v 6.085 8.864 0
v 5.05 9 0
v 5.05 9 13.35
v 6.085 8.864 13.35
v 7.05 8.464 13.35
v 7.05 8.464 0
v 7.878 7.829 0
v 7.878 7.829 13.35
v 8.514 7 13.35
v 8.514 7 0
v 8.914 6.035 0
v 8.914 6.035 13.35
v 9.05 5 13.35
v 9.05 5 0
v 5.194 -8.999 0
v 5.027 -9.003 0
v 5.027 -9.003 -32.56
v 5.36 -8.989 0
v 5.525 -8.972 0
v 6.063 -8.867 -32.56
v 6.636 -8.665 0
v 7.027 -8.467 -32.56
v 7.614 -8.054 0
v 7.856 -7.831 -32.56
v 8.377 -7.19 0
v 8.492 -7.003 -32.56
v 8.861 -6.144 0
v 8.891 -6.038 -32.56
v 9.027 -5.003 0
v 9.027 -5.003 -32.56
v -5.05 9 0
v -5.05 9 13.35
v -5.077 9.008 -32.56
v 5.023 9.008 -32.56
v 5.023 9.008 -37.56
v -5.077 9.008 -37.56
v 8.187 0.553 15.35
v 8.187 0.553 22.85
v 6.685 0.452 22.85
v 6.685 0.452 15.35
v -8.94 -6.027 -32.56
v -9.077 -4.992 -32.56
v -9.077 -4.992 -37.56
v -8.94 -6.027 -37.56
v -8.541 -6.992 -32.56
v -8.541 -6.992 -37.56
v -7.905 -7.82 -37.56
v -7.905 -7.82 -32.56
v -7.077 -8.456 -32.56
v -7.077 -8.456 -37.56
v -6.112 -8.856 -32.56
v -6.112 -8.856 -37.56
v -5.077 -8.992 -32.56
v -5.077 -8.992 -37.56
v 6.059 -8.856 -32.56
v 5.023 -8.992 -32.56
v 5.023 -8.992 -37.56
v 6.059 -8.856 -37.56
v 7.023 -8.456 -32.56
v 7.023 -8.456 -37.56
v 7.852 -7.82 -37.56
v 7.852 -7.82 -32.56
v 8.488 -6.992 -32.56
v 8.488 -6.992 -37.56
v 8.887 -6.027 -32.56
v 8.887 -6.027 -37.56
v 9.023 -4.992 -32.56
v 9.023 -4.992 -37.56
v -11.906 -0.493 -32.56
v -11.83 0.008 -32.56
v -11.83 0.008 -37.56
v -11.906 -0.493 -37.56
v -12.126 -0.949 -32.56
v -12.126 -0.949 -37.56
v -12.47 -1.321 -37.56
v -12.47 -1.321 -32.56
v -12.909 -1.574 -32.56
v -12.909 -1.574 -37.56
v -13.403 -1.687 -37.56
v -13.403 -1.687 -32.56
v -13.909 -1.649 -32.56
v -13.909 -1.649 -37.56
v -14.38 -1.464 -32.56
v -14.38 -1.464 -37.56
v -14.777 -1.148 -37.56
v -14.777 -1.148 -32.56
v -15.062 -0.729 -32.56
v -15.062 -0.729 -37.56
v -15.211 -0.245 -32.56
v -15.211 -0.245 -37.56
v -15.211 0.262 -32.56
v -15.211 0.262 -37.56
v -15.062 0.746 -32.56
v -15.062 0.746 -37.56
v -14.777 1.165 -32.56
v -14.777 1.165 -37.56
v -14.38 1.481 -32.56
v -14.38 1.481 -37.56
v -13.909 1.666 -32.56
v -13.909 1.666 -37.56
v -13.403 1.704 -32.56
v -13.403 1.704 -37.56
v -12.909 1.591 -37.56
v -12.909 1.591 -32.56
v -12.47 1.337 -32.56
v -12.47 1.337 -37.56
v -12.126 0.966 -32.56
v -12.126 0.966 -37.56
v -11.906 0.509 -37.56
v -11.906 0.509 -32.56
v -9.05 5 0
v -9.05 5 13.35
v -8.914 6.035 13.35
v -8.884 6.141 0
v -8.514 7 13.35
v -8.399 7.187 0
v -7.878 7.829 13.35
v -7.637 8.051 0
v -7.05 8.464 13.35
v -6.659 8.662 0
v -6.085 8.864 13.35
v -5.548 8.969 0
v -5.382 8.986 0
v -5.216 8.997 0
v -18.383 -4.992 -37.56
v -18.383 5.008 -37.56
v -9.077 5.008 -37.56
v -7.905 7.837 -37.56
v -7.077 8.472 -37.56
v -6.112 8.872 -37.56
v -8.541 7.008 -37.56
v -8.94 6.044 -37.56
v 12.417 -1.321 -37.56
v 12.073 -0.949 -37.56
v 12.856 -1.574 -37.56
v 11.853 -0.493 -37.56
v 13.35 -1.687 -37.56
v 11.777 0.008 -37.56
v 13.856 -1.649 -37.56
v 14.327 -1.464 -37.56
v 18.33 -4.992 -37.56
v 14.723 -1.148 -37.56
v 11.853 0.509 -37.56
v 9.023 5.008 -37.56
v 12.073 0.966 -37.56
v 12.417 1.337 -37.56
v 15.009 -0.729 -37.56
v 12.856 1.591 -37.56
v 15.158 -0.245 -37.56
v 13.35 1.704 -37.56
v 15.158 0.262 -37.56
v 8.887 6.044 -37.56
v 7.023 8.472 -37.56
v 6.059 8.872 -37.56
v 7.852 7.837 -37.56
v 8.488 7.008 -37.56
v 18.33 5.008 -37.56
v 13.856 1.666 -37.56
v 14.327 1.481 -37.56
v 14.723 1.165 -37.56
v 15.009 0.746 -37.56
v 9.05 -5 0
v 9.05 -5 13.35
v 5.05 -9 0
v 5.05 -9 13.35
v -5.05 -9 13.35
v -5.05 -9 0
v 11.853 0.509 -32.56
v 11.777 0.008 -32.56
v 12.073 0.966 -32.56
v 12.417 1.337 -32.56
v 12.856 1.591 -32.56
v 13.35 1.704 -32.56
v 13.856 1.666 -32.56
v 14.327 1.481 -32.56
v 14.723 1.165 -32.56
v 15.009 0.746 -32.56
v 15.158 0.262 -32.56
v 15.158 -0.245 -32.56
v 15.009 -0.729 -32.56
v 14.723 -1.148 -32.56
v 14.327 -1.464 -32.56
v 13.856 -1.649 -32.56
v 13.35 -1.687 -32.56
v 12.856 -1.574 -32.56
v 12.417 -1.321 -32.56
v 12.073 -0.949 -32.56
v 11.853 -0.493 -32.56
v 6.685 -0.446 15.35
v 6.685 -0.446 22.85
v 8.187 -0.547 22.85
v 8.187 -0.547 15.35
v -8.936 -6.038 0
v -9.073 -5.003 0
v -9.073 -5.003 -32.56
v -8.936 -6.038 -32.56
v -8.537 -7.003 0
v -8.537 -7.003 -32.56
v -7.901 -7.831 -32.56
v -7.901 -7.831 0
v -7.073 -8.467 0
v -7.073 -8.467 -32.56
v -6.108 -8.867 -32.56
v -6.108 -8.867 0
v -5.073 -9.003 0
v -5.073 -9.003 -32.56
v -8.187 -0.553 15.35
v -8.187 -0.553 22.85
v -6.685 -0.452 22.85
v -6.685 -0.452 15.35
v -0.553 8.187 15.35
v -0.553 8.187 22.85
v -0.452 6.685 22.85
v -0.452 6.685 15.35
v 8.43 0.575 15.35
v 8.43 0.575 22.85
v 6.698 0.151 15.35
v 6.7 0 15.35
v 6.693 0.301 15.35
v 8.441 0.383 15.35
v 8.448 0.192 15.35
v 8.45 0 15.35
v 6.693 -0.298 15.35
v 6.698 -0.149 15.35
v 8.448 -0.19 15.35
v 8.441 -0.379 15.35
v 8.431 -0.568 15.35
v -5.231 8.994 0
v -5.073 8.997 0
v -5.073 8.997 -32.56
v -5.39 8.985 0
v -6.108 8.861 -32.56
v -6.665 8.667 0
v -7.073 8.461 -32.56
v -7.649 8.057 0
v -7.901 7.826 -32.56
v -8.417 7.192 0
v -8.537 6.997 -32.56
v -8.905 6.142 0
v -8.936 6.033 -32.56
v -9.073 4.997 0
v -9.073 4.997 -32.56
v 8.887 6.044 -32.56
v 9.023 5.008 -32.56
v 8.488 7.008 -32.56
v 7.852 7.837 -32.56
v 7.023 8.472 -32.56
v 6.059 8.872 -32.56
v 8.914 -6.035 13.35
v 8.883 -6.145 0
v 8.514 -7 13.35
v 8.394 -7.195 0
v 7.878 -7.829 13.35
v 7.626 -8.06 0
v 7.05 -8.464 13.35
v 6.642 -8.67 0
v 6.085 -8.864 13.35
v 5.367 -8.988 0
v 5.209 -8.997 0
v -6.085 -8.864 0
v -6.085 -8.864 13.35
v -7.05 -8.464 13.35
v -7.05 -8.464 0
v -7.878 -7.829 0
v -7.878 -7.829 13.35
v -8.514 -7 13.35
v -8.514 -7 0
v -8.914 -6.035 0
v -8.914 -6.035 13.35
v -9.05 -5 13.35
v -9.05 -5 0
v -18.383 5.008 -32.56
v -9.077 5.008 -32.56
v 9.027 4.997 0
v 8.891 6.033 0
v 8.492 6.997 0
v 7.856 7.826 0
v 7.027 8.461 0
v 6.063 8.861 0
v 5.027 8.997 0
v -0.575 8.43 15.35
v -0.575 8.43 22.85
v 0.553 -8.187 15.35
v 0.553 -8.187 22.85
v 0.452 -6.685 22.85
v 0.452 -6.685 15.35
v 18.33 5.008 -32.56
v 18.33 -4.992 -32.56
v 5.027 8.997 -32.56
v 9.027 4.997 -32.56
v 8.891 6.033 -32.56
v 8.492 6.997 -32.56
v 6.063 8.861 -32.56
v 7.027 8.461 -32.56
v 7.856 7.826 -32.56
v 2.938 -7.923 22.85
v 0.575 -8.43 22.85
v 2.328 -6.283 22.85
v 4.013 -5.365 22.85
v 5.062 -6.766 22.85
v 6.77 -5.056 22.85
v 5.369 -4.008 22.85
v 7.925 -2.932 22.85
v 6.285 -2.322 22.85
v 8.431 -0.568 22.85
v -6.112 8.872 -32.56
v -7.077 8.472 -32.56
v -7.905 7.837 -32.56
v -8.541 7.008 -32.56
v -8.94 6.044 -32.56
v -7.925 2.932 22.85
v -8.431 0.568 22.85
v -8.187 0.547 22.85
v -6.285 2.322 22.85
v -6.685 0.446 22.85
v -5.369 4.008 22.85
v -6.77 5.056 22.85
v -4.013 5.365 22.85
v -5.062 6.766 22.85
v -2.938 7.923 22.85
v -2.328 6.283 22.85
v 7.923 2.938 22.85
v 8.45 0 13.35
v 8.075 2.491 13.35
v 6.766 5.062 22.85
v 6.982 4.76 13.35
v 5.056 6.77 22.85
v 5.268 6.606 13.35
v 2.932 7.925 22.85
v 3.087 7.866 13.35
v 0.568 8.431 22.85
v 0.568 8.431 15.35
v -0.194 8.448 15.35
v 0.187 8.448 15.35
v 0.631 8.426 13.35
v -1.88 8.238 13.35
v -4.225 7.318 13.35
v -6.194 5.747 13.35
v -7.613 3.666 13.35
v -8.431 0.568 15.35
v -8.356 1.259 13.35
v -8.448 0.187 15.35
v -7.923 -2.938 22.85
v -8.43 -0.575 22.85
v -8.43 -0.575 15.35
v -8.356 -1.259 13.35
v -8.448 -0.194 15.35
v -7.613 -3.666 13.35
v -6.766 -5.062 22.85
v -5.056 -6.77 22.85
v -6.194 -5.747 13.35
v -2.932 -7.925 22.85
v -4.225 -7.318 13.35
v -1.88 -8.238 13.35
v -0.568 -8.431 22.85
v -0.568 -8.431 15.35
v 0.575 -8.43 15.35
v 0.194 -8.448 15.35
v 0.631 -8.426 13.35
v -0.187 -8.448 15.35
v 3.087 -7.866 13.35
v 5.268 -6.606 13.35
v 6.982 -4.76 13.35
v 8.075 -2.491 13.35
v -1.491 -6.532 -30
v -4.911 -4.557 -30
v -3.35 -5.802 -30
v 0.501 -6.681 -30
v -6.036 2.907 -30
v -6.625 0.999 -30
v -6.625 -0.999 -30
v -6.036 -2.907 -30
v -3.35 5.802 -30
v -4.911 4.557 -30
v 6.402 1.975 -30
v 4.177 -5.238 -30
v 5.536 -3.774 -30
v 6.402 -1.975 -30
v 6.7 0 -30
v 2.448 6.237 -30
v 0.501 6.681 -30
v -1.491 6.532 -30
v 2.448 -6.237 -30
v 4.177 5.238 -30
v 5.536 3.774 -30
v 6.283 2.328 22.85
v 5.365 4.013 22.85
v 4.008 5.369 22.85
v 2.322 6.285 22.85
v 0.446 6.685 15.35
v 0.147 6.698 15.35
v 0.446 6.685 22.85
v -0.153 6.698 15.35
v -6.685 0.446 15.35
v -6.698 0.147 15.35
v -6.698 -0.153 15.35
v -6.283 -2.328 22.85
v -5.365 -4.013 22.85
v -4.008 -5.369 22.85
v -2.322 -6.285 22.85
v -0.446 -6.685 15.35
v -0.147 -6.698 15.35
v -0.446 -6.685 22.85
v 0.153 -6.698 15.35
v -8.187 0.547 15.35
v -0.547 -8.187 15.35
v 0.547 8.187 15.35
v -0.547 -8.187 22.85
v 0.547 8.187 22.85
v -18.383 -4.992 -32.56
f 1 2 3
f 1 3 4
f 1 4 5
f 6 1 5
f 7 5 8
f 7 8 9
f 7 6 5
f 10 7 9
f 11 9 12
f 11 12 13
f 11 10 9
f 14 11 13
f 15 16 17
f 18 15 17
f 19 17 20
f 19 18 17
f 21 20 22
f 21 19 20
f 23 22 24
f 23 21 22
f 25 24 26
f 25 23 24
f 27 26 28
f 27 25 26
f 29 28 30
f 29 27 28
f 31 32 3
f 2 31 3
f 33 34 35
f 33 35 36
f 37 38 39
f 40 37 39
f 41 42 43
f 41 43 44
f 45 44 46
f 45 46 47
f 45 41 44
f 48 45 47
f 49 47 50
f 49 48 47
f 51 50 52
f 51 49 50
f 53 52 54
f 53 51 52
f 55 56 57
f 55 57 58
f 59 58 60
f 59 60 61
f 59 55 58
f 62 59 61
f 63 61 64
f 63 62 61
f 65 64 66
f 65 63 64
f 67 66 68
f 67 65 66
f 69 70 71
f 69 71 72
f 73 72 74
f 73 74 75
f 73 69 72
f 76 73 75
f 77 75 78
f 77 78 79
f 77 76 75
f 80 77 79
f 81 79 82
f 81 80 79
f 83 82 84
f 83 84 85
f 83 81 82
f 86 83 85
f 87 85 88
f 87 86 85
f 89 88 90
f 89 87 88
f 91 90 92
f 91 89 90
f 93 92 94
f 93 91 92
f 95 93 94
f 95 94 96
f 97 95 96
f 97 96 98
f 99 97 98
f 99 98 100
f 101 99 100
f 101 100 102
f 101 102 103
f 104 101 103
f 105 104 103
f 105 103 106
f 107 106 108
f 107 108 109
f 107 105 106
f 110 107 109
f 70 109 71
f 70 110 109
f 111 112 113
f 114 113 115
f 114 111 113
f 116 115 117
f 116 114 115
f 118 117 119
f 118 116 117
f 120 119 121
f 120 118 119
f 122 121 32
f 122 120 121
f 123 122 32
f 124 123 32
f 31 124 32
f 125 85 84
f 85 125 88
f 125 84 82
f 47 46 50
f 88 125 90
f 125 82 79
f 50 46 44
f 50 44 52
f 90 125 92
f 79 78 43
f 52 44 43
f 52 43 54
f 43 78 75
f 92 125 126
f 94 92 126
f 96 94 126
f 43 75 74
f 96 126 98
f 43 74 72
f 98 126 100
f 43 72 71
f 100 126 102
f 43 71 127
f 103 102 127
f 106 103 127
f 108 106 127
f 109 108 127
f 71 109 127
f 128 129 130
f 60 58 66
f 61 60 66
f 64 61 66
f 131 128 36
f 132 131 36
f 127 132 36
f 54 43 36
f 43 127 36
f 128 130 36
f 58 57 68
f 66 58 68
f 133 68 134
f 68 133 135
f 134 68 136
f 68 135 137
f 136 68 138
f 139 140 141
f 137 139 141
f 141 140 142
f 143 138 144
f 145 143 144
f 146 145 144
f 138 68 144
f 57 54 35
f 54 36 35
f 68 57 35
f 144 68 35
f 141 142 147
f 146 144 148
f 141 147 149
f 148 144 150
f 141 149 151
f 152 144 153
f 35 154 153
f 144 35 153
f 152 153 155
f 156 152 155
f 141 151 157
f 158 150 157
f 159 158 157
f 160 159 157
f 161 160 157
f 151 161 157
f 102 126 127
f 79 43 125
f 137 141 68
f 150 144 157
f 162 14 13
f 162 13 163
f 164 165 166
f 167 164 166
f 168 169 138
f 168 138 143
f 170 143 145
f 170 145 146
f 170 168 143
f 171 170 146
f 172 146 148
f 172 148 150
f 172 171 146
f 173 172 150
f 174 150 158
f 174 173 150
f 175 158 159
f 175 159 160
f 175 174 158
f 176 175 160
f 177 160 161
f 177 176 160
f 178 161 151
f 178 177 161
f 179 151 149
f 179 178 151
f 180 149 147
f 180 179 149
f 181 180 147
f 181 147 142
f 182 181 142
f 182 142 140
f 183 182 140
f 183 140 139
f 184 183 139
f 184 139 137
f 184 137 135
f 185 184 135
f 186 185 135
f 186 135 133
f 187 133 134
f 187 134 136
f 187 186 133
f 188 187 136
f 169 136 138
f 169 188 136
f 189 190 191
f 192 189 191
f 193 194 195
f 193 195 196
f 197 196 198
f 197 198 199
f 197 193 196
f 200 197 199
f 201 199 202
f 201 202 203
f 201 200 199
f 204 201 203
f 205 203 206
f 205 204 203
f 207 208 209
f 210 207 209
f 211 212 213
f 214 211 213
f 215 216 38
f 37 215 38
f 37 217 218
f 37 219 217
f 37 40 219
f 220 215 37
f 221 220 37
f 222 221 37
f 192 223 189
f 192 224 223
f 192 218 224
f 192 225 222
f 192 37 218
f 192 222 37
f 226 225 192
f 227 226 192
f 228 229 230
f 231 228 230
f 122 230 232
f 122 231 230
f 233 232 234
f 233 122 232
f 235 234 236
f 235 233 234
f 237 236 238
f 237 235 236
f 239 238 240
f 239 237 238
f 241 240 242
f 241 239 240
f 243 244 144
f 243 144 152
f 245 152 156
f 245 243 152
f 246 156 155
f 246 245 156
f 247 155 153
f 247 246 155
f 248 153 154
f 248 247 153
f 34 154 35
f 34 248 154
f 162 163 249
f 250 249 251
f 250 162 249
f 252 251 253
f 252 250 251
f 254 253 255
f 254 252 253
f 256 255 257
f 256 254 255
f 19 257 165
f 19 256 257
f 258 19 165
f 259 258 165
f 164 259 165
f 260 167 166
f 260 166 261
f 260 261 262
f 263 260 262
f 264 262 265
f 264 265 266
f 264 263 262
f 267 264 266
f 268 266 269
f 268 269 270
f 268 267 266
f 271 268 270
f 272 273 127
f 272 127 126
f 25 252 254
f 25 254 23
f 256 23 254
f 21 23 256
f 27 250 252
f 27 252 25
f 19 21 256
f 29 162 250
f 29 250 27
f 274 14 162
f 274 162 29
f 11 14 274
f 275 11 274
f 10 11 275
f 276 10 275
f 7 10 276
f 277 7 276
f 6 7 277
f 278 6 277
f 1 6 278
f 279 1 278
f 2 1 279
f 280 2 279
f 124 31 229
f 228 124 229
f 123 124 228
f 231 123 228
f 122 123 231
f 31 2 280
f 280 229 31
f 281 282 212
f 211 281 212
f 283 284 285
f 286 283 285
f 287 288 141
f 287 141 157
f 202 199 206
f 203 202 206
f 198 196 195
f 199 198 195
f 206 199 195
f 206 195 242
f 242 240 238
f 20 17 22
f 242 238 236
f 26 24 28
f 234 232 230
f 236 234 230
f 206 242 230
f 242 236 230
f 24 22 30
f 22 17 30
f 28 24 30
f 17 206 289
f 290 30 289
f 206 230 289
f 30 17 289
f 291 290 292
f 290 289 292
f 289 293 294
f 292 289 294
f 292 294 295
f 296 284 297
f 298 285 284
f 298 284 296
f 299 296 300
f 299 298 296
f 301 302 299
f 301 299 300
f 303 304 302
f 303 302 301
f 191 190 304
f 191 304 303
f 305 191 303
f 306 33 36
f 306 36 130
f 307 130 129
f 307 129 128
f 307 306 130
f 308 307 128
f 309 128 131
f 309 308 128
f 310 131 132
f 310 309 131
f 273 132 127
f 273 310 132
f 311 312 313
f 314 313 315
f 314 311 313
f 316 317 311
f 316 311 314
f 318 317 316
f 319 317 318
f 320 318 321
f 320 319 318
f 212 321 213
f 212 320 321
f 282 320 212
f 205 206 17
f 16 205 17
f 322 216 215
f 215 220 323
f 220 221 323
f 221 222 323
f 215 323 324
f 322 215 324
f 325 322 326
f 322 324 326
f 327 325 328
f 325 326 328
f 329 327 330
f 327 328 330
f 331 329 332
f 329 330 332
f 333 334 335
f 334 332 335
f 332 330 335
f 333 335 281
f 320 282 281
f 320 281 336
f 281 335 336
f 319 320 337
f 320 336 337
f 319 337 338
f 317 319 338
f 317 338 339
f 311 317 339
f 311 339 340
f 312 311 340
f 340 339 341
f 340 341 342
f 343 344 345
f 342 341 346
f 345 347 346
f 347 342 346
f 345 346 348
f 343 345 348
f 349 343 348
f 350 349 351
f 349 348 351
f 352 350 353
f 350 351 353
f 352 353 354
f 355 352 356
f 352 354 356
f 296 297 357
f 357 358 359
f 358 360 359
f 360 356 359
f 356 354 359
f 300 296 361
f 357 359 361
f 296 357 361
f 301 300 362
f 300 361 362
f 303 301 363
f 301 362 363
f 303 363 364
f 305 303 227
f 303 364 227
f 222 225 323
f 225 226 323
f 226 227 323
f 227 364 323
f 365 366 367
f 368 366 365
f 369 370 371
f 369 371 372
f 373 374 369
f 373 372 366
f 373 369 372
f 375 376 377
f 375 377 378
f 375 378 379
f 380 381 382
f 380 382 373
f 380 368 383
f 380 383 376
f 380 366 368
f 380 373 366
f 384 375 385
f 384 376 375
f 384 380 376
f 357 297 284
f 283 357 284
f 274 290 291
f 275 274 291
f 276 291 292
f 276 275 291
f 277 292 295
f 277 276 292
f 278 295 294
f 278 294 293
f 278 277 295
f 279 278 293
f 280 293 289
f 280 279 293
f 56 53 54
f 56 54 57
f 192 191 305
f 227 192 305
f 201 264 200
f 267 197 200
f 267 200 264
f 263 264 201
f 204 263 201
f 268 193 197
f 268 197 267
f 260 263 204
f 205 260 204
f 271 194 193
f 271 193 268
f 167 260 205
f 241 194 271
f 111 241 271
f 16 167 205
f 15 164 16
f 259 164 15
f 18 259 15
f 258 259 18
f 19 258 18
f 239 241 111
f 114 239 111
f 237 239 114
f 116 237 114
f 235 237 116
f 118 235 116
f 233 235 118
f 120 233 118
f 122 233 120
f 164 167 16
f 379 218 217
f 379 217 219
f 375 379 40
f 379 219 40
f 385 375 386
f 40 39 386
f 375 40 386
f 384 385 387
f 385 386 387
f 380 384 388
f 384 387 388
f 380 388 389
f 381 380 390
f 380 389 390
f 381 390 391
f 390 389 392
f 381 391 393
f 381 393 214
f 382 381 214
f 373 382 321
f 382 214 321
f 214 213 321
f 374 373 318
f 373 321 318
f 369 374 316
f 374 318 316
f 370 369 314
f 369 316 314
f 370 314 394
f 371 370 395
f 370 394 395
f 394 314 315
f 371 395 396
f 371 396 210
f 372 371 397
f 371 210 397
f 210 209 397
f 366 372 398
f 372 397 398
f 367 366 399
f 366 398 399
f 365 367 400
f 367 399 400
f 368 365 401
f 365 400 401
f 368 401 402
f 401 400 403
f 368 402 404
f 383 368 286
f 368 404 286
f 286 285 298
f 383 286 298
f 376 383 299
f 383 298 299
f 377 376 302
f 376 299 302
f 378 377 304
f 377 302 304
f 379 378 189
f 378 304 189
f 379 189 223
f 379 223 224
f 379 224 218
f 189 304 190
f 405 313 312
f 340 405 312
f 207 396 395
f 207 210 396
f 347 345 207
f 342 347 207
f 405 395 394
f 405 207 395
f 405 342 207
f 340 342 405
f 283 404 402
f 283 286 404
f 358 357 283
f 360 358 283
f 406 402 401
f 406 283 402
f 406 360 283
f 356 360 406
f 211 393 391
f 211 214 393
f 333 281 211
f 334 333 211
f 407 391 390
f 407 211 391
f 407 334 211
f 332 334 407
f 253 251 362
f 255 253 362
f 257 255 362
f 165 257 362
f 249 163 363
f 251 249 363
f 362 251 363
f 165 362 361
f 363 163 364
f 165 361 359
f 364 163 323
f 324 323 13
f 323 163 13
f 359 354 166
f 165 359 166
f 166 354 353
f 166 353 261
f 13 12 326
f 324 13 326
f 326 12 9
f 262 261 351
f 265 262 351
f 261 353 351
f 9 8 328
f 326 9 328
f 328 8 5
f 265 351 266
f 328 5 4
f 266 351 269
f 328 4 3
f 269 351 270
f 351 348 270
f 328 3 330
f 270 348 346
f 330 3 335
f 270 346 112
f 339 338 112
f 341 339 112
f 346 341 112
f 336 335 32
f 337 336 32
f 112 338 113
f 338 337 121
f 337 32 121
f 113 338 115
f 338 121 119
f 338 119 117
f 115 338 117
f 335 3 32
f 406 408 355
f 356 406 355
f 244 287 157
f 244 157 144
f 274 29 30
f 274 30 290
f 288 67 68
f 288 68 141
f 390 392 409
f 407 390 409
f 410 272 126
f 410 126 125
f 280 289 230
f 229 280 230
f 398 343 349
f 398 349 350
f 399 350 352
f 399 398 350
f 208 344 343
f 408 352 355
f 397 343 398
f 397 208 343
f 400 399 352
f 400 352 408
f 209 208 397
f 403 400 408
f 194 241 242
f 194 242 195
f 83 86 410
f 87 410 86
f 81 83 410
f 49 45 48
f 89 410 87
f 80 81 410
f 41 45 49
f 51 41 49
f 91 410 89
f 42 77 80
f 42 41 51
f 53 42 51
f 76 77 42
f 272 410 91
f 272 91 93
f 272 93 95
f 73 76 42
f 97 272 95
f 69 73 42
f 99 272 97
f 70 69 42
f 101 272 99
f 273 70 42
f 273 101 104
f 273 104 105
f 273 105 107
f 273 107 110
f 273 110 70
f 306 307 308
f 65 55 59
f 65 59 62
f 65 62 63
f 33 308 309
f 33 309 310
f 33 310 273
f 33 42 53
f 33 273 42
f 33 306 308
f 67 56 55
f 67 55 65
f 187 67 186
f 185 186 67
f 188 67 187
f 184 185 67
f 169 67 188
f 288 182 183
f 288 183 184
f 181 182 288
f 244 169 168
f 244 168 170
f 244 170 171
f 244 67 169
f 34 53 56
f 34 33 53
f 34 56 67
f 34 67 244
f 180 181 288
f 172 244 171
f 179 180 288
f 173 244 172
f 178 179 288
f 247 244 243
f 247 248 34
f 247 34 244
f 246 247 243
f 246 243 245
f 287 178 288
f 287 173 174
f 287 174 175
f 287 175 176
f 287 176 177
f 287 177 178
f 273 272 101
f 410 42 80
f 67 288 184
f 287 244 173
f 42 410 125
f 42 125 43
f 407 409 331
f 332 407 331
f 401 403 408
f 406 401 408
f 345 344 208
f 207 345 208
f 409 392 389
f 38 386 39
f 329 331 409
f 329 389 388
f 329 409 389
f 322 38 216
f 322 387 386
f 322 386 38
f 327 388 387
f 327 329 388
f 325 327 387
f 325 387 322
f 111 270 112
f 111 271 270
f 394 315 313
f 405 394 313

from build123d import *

# Parameters (mm, degrees)
BOSS_EXTRUDE1_DEPTH = 2
BOSS_EXTRUDE2_DEPTH = 11.74993
BOSS_EXTRUDE3_DEPTH = 1.6
SKETCH4_R           = 8.45
BOSS_EXTRUDE4_DEPTH = 9.5
SKETCH5_R           = 6.65
CUT_EXTRUDE1_DEPTH  = 20
BOSS_EXTRUDE5_DEPTH = 32.56
SKETCH13_R          = 6.7
CUT_EXTRUDE3_DEPTH  = 30
CUT_EXTRUDE4_DEPTH  = 7.5
CIRPATTERN2_COUNT   = 4
SKETCH16_R          = 1.7
BOSS_EXTRUDE6_DEPTH = 5


with BuildPart() as part:
    # Sketch1 → Boss-Extrude1 (new body)
    with BuildSketch(Plane.XY):
        with BuildLine():
            Line((-5.05, 9.000108401), (5.05, 9.000108401))
            ThreePointArc((5.05, 9.000108401), (7.878427125, 7.828535526), (9.05, 5.000108401))
            Line((9.05, 5.000108401), (9.05, -5.000108401))
            ThreePointArc((9.05, -5.000108401), (7.878427125, -7.828535526), (5.05, -9.000108401))
            Line((5.05, -9.000108401), (-5.05, -9.000108401))
            ThreePointArc((-5.05, -9.000108401), (-7.878427125, -7.828535526), (-9.05, -5.000108401))
            Line((-9.05, -5.000108401), (-9.05, 5.000108401))
            ThreePointArc((-9.05, 5.000108401), (-7.878427125, 7.828535526), (-5.05, 9.000108401))
        make_face()
    extrude(amount=BOSS_EXTRUDE1_DEPTH)

    # Sketch2 → Boss-Extrude2 (add)
    with BuildSketch(Plane.XY):
        with BuildLine():
            Line((-5.05, 9.000108401), (5.05, 9.000108401))
            ThreePointArc((5.05, 9.000108401), (7.878427125, 7.828535526), (9.05, 5.000108401))
            Line((9.05, 5.000108401), (9.05, -5.000108401))
            ThreePointArc((9.05, -5.000108401), (7.878427125, -7.828535526), (5.05, -9.000108401))
            Line((5.05, -9.000108401), (-5.05, -9.000108401))
            ThreePointArc((-5.05, -9.000108401), (-7.878427125, -7.828535526), (-9.05, -5.000108401))
            Line((-9.05, -5.000108401), (-9.05, 5.000108401))
            ThreePointArc((-9.05, 5.000108401), (-7.878427125, 7.828535526), (-5.05, 9.000108401))
        make_face()
    extrude(amount=BOSS_EXTRUDE2_DEPTH)

    # Sketch3 → Boss-Extrude3 (add)
    with BuildSketch(Plane.XY.offset(11.74993)):
        with BuildLine():
            Line((-5.05, 9.000108401), (5.05, 9.000108401))
            ThreePointArc((5.05, 9.000108401), (7.878427125, 7.828535526), (9.05, 5.000108401))
            Line((9.05, 5.000108401), (9.05, -5.000108401))
            ThreePointArc((9.05, -5.000108401), (7.878427125, -7.828535526), (5.05, -9.000108401))
            Line((5.05, -9.000108401), (-5.05, -9.000108401))
            ThreePointArc((-5.05, -9.000108401), (-7.878427125, -7.828535526), (-9.05, -5.000108401))
            Line((-9.05, -5.000108401), (-9.05, 5.000108401))
            ThreePointArc((-9.05, 5.000108401), (-7.878427125, 7.828535526), (-5.05, 9.000108401))
        make_face()
    extrude(amount=BOSS_EXTRUDE3_DEPTH)

    # Sketch4 → Boss-Extrude4 (add)
    with BuildSketch(Plane.XY.offset(13.34993)):
        Circle(SKETCH4_R)
    extrude(amount=BOSS_EXTRUDE4_DEPTH)

    # Sketch5 → Cut-Extrude1 (cut)
    with BuildSketch(Plane.XY.offset(13.34993)):
        Circle(SKETCH5_R)
    extrude(amount=CUT_EXTRUDE1_DEPTH, mode=Mode.SUBTRACT)

    # Sketch12 → Boss-Extrude5 (add)
    with BuildSketch(Plane(origin=(0, 0, 0), x_dir=(-1, 0, 0), z_dir=(0, 0, -1))):
        with BuildLine():
            Line((-5.027404416, 8.997340309), (5.072595584, 8.997340309))
            ThreePointArc((5.072595584, 8.997340309), (7.901022709, 7.825767433), (9.072595584, 4.997340309))
            Line((9.072595584, 4.997340309), (9.072595584, -5.002876493))
            ThreePointArc((9.072595584, -5.002876493), (7.901022709, -7.831303618), (5.072595584, -9.002876493))
            Line((5.072595584, -9.002876493), (-5.027404416, -9.002876493))
            ThreePointArc((-5.027404416, -9.002876493), (-7.85583154, -7.831303618), (-9.027404416, -5.002876493))
            Line((-9.027404416, -5.002876493), (-9.027404416, 4.997340309))
            ThreePointArc((-9.027404416, 4.997340309), (-7.85583154, 7.825767433), (-5.027404416, 8.997340309))
        make_face()
    extrude(amount=BOSS_EXTRUDE5_DEPTH)

    # Sketch13 → Cut-Extrude3 (cut, symmetric)
    with BuildSketch(Plane.XY):
        Circle(SKETCH13_R)
    extrude(amount=CUT_EXTRUDE3_DEPTH, both=True, mode=Mode.SUBTRACT)

    # Sketch15 → Cut-Extrude4 (cut)
    with BuildSketch(Plane.XY.offset(22.84993)):
        Polygon((-0.552830798, 8.187091014), (-0.002830798, 0.003314653), (0.547169202, 8.187091014), (0.617169202, 9.000108401), (-0.626042329, 9.000108401), align=None)
    cut_extrude4 = extrude(amount=-CUT_EXTRUDE4_DEPTH, mode=Mode.SUBTRACT)

    # CirPattern2: Cut-Extrude4 ×4 about axis
    cirpattern2_axis = Axis((0, 0, 0), (0, 0, 1))
    for i in range(1, CIRPATTERN2_COUNT):
        add(cut_extrude4.rotate(cirpattern2_axis, i * 360 / CIRPATTERN2_COUNT), mode=Mode.SUBTRACT)


with BuildPart() as body_2:
    # Sketch16 → Boss-Extrude6 (new body)
    with BuildSketch(Plane(origin=(0, 0, -32.56), x_dir=(-1, 0, 0), z_dir=(0, 0, -1))):
        with BuildLine():
            Line((-5.023439618, 9.008375808), (5.076560382, 9.008375808))
            ThreePointArc((5.076560382, 9.008375808), (7.904987507, 7.836802933), (9.076560382, 5.008375808))
            Line((9.076560382, 5.008375808), (18.383296185, 5.008375808))
            Line((18.383296185, 5.008375808), (18.383296185, -4.991840993))
            Line((18.383296185, -4.991840993), (9.076560382, -4.991840993))
            ThreePointArc((9.076560382, -4.991840993), (7.904987507, -7.820268118), (5.076560382, -8.991840993))
            Line((5.076560382, -8.991840993), (-5.023439618, -8.991840993))
            ThreePointArc((-5.023439618, -8.991840993), (-7.851866743, -7.820268118), (-9.023439618, -4.991840993))
            Line((-9.023439618, -4.991840993), (-18.330175421, -4.991840993))
            Line((-18.330175421, -4.991840993), (-18.330175421, 5.008375808))
            Line((-18.330175421, 5.008375808), (-9.023439618, 5.008375808))
            ThreePointArc((-9.023439618, 5.008375808), (-7.851866743, 7.836802933), (-5.023439618, 9.008375808))
        make_face()
        with Locations((-13.477242349, 0.008267407)):
            Circle(SKETCH16_R, mode=Mode.SUBTRACT)
        with Locations(Location((13.530363113, 0.008267407, 0), (0, 0, 180))):
            Circle(SKETCH16_R, mode=Mode.SUBTRACT)
    extrude(amount=BOSS_EXTRUDE6_DEPTH)


solid = Compound([part.part, body_2.part])
